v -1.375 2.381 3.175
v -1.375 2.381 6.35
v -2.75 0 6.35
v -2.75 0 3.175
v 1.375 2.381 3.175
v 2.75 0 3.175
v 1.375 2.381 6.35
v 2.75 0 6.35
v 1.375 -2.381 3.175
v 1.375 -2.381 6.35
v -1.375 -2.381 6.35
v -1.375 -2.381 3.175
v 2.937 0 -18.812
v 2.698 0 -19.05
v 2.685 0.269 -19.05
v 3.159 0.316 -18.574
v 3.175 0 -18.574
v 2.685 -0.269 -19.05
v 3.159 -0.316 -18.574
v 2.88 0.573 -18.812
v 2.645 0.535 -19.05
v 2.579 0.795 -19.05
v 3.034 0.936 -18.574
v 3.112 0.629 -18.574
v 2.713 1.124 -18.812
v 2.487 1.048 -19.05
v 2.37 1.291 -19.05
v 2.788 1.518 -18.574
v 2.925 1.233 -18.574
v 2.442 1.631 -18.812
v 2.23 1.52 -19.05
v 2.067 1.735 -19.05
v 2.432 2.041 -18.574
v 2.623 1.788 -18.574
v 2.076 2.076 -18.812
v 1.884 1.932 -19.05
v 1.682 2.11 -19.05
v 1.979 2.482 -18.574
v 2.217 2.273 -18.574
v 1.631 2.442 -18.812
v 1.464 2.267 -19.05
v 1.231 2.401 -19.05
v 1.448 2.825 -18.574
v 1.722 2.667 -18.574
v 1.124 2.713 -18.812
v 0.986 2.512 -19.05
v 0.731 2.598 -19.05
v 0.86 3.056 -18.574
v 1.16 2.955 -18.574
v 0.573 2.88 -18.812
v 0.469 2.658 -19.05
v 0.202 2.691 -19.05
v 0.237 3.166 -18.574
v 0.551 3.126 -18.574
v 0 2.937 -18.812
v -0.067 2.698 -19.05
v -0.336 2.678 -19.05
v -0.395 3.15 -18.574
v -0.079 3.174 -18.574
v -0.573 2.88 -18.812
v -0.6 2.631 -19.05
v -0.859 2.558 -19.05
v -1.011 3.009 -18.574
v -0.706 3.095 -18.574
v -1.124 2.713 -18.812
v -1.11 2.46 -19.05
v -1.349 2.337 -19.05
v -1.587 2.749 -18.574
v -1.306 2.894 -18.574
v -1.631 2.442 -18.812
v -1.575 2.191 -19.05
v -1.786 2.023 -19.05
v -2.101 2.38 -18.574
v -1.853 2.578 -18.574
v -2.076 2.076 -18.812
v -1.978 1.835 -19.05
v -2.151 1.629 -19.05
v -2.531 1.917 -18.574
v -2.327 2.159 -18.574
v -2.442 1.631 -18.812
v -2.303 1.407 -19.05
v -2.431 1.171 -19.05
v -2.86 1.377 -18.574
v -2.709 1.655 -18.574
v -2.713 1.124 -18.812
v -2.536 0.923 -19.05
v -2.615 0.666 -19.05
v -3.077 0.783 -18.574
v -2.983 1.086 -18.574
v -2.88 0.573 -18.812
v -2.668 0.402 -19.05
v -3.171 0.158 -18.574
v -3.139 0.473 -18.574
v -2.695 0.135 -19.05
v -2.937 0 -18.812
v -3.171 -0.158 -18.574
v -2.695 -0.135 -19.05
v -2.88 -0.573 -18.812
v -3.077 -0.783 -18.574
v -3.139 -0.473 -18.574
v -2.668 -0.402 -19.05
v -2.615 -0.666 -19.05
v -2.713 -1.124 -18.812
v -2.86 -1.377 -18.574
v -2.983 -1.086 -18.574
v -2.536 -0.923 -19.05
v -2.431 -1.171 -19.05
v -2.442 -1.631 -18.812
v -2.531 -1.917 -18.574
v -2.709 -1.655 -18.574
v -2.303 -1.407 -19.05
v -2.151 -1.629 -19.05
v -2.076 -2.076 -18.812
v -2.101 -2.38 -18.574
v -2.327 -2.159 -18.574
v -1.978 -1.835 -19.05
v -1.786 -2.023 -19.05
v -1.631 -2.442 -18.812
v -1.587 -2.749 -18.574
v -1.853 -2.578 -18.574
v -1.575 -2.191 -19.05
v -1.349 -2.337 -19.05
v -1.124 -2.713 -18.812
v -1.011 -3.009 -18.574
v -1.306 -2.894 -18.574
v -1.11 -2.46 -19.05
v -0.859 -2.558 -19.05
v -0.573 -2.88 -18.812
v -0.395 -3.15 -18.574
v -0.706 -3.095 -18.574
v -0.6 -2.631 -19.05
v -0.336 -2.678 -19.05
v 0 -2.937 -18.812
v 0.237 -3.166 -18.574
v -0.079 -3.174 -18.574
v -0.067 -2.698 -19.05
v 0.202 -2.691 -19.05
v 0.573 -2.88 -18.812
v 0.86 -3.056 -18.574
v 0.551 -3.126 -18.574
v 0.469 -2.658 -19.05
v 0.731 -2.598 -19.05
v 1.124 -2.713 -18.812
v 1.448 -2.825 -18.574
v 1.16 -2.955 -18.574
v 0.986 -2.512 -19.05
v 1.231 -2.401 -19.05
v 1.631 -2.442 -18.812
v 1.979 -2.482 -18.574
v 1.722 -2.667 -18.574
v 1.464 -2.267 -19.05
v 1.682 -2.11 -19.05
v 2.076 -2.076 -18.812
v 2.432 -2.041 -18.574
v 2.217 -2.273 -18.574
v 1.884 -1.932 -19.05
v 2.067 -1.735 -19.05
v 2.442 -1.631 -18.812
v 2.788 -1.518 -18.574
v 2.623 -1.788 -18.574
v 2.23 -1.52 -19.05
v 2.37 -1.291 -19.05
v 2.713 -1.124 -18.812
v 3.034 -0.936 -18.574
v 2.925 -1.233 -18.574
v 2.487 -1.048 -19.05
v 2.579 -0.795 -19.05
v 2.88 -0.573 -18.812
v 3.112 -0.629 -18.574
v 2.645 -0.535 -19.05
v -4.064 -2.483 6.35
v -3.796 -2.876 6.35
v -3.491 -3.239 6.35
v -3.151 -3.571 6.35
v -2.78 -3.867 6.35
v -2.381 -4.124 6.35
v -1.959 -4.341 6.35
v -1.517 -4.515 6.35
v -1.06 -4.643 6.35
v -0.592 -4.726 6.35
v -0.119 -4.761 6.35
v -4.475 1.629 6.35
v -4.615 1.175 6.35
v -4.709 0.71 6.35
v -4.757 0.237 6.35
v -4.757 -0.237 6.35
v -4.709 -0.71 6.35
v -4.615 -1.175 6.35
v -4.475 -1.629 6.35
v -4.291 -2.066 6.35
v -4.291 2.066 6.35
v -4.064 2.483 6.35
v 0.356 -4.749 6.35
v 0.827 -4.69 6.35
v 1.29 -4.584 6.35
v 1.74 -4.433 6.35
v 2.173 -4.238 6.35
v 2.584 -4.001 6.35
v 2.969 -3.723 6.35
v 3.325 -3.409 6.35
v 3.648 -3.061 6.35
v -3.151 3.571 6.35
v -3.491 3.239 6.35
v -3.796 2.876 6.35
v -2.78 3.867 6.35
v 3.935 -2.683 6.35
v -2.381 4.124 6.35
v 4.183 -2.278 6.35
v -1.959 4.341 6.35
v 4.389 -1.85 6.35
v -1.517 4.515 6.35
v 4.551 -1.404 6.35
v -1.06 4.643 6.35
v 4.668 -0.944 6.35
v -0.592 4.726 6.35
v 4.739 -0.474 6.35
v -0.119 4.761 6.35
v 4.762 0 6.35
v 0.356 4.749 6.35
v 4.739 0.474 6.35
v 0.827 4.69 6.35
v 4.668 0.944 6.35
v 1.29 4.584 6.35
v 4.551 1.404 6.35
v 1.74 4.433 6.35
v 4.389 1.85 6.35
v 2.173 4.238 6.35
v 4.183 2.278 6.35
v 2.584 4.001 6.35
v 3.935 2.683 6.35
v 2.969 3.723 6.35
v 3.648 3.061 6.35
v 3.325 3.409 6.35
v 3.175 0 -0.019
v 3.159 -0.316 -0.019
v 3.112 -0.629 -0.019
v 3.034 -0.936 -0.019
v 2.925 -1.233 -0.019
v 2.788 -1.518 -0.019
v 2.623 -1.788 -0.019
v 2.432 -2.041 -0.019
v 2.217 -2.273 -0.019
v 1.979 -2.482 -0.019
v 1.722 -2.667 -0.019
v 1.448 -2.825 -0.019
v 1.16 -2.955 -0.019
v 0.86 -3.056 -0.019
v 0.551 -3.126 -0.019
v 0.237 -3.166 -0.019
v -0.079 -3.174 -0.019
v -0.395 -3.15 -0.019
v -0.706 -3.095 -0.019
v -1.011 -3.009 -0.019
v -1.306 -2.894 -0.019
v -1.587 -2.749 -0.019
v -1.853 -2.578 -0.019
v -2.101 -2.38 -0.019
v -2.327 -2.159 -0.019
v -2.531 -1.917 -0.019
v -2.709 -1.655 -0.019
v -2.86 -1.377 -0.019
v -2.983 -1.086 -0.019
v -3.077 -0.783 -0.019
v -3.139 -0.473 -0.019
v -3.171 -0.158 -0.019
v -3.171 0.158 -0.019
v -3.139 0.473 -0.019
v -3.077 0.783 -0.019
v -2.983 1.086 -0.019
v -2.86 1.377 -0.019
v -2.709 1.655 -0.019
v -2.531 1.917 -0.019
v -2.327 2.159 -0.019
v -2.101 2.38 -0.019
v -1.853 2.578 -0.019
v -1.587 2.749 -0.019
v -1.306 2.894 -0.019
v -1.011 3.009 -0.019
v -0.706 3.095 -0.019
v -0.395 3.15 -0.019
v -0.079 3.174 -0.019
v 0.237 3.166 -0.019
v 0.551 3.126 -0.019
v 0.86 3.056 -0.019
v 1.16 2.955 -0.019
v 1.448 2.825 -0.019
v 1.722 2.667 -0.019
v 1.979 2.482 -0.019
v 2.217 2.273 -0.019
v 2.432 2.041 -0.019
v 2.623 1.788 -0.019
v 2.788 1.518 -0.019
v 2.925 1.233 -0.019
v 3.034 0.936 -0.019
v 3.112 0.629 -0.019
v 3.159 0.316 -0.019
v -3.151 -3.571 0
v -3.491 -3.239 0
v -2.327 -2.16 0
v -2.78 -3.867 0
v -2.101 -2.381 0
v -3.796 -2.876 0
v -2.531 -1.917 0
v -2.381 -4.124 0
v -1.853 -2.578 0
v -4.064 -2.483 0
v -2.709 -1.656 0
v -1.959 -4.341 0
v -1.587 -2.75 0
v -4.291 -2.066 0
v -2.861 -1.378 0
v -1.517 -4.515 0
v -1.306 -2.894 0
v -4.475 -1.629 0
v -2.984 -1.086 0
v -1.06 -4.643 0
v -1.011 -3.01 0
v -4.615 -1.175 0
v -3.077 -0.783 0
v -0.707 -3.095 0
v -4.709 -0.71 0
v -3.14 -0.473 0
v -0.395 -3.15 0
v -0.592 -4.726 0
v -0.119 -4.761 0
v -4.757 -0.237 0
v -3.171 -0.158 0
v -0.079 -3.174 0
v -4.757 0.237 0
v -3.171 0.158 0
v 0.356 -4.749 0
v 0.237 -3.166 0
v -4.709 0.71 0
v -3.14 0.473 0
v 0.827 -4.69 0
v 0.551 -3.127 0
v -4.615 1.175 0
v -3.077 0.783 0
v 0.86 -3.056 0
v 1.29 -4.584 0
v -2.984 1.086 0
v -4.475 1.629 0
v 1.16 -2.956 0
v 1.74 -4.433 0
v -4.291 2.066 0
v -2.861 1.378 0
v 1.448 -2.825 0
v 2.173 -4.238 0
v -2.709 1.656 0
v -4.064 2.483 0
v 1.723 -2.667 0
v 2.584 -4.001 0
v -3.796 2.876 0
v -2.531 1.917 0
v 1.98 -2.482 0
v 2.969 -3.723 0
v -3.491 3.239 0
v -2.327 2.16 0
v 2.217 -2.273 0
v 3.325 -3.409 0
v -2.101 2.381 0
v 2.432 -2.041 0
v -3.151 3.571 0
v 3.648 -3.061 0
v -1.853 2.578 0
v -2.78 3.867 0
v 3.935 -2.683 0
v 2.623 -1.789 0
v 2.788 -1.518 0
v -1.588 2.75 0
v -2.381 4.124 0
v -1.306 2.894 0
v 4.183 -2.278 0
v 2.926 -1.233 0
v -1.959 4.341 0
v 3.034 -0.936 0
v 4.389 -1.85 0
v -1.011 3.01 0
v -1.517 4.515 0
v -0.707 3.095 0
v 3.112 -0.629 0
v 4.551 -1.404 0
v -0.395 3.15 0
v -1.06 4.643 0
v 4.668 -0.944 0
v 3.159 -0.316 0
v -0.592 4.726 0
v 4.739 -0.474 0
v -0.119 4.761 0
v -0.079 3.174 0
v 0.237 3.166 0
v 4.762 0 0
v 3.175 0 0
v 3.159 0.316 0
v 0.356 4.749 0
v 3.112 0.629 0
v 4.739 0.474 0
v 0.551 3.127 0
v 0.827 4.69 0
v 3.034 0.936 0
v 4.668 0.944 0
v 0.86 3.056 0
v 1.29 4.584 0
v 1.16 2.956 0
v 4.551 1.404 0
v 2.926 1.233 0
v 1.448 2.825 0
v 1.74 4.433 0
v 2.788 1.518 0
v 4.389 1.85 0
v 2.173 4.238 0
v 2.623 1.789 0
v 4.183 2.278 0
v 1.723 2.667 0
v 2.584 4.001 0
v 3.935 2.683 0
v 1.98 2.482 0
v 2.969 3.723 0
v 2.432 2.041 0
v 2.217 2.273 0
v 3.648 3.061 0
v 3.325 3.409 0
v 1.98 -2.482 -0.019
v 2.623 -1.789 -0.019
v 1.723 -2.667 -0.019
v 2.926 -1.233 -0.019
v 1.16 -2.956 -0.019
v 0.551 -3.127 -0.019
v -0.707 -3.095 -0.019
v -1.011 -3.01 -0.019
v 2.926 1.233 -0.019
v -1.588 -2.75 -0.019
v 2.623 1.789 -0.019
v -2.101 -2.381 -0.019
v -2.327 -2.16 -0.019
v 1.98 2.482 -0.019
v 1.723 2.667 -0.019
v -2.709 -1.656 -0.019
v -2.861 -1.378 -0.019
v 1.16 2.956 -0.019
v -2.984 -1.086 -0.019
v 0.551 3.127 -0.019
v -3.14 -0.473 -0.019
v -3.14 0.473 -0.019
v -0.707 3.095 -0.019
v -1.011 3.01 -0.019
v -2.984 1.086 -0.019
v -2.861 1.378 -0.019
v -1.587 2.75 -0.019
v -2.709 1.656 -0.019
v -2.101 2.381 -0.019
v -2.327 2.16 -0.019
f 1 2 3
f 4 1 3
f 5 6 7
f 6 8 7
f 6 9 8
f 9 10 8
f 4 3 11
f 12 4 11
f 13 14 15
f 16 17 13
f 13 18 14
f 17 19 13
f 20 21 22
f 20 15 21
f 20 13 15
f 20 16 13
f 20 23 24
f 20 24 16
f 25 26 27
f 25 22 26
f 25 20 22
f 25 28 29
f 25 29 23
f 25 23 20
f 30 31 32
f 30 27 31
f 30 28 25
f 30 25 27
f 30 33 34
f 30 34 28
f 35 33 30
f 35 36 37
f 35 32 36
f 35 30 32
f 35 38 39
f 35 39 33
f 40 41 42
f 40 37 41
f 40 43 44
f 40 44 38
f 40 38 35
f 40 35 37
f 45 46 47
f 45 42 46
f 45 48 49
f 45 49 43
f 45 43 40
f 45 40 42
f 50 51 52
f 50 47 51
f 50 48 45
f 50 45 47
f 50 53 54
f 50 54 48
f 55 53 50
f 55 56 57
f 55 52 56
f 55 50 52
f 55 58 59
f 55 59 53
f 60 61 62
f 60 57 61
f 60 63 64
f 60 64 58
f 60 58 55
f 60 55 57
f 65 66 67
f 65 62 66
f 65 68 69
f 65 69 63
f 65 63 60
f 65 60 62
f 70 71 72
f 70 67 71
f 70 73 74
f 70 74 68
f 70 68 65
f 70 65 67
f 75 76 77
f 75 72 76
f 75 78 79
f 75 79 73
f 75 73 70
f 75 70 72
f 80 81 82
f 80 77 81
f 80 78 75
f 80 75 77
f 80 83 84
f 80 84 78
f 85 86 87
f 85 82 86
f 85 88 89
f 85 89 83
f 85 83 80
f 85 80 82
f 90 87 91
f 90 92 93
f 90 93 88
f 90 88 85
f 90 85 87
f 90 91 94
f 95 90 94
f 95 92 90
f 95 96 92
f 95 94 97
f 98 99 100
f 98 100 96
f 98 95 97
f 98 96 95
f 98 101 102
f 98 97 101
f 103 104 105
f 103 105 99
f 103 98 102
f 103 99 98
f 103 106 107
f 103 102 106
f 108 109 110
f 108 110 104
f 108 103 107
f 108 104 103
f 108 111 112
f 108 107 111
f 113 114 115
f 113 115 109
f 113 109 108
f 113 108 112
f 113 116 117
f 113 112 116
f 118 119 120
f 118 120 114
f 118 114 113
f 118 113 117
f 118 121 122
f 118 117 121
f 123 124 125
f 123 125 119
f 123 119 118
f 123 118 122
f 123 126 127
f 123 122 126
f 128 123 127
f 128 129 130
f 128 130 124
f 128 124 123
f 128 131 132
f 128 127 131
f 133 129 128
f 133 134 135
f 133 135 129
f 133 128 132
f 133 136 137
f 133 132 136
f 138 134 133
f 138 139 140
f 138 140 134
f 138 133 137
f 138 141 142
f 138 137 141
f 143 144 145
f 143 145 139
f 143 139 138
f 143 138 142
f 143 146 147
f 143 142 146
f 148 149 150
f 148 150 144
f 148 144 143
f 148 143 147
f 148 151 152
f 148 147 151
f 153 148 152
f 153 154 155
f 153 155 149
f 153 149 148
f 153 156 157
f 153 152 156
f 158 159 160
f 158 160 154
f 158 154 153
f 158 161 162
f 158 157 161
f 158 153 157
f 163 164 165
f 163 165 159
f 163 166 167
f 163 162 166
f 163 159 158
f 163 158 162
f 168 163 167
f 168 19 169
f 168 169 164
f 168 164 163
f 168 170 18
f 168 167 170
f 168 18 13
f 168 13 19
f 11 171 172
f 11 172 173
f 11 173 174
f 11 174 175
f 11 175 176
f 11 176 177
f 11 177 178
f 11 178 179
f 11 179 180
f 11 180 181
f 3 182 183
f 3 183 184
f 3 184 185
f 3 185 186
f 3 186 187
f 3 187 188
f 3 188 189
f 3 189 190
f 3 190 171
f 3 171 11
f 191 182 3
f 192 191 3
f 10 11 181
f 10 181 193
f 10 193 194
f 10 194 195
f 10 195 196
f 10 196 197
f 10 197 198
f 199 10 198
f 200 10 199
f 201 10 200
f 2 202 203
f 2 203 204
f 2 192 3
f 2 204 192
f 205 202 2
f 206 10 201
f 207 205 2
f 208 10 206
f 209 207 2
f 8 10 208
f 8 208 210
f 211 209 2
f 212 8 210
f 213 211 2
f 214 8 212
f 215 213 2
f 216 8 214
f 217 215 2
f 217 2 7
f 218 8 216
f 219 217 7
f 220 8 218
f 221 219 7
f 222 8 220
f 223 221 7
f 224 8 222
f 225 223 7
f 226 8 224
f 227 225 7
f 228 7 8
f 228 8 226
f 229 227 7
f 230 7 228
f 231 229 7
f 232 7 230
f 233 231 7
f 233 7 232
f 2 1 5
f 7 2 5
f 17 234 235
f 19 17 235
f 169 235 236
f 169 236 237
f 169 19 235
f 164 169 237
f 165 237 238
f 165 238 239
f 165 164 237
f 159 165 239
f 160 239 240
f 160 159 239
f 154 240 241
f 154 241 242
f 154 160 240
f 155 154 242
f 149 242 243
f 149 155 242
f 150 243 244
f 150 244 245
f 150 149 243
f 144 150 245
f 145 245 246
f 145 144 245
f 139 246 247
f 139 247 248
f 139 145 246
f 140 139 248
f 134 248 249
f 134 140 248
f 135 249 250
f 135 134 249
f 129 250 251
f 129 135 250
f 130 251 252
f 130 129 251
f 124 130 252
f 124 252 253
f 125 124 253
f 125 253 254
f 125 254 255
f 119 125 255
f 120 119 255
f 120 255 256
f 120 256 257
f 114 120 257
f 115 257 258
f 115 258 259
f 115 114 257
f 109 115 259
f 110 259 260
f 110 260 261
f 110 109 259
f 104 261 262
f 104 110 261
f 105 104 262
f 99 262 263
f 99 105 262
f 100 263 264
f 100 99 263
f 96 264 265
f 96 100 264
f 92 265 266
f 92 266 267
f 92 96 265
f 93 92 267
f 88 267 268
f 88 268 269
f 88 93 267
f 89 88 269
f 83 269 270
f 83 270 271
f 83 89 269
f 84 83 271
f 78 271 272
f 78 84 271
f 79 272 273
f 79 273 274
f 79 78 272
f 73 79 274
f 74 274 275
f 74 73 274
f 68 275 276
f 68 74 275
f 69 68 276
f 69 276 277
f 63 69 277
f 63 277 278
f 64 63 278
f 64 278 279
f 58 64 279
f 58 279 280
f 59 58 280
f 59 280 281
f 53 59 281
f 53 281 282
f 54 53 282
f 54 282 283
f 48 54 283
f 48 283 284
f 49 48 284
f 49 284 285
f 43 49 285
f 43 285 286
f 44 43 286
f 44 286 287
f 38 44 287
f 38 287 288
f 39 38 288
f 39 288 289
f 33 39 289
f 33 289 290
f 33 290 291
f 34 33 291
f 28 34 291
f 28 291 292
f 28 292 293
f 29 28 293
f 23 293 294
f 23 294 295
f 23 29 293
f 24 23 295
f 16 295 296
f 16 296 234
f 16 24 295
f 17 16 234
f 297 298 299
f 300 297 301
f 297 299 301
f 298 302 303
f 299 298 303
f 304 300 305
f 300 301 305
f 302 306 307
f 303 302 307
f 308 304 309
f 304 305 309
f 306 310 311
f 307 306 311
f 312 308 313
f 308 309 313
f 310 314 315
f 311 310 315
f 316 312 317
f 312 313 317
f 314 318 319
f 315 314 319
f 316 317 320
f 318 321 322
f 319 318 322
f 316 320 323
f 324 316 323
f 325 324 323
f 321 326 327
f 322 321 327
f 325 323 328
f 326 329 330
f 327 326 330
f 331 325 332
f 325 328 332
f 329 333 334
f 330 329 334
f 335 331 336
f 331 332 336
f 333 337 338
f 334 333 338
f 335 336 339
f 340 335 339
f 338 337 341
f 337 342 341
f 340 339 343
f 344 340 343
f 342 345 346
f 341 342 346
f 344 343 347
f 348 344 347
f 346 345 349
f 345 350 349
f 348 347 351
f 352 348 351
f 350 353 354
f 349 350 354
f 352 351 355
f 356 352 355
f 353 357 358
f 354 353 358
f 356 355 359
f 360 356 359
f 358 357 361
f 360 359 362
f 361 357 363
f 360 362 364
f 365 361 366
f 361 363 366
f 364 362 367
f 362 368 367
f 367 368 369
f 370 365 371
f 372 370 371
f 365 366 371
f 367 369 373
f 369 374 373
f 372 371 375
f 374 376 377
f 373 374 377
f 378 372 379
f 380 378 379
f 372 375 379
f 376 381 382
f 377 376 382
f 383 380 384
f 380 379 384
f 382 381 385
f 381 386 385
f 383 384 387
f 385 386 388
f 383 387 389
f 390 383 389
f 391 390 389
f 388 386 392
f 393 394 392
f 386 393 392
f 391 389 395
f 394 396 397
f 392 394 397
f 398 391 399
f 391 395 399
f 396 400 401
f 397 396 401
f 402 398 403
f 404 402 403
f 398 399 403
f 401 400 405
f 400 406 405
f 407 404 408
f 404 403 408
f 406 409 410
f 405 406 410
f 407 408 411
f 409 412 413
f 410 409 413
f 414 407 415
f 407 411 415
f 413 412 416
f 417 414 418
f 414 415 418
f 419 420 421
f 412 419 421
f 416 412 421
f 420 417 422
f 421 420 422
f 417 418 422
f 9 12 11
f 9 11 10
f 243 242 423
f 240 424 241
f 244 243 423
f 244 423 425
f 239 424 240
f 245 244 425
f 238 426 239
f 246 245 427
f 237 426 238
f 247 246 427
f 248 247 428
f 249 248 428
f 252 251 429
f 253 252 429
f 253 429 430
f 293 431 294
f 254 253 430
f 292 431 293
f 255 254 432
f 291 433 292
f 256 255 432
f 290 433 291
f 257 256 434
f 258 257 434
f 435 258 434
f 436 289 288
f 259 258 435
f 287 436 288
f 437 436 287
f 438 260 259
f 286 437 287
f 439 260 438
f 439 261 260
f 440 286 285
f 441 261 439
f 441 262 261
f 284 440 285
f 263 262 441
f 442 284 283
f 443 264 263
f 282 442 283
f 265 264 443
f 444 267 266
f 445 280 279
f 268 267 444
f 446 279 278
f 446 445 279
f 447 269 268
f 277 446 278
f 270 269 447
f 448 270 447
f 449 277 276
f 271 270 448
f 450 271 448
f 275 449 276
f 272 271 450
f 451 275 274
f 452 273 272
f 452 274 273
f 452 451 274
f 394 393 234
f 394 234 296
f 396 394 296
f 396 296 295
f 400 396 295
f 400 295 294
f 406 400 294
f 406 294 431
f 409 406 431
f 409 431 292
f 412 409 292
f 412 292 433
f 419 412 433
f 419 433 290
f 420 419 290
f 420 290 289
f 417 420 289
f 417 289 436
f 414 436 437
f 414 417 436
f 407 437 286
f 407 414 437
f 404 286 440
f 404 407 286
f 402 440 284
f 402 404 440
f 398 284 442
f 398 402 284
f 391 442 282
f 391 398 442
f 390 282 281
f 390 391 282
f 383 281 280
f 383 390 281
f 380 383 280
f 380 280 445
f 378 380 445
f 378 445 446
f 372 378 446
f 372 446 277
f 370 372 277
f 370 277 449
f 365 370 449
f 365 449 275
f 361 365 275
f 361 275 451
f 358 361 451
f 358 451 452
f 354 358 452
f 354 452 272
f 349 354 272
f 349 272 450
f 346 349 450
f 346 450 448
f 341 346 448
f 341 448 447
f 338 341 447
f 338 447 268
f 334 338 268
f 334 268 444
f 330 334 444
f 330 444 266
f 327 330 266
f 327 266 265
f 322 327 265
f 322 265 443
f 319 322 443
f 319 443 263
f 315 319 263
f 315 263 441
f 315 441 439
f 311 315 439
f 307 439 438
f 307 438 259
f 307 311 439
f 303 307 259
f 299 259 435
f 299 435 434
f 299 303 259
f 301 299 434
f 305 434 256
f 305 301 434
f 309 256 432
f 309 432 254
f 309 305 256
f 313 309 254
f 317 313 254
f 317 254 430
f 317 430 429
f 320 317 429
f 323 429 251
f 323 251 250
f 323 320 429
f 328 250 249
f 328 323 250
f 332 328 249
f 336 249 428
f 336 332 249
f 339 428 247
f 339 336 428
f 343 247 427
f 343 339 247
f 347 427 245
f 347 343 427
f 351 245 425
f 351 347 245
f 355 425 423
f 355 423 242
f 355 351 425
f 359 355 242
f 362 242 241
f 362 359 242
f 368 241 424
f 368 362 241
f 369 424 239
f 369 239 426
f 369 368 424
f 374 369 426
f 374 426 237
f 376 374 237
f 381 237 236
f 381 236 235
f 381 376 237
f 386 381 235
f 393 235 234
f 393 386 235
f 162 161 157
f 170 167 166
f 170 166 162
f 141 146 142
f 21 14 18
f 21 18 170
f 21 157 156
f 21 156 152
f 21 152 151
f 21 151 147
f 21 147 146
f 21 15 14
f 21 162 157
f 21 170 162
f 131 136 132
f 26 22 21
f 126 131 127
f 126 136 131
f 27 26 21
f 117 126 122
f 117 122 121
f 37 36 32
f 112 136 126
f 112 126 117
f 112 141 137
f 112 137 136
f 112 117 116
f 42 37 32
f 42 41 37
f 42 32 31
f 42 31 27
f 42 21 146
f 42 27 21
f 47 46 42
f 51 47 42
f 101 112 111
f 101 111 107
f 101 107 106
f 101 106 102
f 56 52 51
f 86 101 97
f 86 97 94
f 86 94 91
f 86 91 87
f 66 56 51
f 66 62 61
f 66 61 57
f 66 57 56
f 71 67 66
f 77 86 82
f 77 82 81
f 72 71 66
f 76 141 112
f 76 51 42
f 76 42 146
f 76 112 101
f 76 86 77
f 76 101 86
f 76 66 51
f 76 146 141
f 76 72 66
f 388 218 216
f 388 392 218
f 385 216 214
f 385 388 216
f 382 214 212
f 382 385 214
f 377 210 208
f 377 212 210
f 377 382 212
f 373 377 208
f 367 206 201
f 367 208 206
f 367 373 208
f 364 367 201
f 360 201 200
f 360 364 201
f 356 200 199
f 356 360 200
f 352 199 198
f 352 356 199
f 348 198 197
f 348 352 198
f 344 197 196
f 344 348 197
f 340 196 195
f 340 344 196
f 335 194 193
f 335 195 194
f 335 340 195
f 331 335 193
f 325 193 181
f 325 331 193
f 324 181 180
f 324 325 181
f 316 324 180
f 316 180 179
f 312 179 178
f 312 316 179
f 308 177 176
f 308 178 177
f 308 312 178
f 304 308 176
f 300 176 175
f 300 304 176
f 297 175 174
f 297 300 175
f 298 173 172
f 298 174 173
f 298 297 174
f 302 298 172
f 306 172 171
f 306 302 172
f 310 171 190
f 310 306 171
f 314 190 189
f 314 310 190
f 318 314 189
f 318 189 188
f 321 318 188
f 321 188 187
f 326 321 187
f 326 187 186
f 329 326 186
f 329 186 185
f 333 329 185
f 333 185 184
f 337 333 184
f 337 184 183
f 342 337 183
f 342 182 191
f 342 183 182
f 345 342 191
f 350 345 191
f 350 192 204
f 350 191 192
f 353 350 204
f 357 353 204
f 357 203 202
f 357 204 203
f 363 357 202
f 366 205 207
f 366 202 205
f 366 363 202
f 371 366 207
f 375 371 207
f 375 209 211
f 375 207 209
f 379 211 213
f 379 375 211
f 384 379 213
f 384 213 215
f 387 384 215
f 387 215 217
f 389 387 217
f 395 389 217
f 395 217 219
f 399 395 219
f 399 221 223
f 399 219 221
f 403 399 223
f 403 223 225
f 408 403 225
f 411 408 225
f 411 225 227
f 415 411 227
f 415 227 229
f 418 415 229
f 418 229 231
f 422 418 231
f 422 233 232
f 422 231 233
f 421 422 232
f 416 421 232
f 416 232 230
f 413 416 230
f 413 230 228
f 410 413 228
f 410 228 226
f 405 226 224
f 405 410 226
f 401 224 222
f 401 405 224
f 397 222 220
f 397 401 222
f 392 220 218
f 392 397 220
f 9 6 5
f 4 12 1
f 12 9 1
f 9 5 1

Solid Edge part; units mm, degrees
sketch "Sketch1" plane through (0, 0, 0) normal (0, 0, 1) x (1, 0, 0)
  circle A0 centre (0, 0) radius 4.7625
  dimension "D1" = 9.525
extrude "Protrusion1" add sketch "Sketch1" along normal blind 6.35
sketch "Sketch2" plane through (0, 0, 0) normal (0, 0, -1) x (1, 0, 0)
  circle A0 centre (0, 0) radius 3.175
extrude "Protrusion2" add sketch "Sketch2" along normal blind 19.05
sketch "Sketch3" plane through (0, 0, -19.05) normal (0, 0, -1) x (1, 0, 0)
  circle A0 centre (0, 0) radius 3.1747
extrude "Cutout1" cut sketch "Sketch3" against normal blind 19.0309 flip side to cut
chamfer "Chamfer_1" distance 0.4762 angle 45 1 edges at (-3.1747, 0, -19.05)
sketch "Sketch4" plane through (0, 0, 6.35) normal (0, 0, 1) x (1, 0, 0)
  line L0 (-1.3748, 2.3812) -> (1.3748, 2.3812)
  line L1 (2.7496, 0) -> (1.3748, 2.3812)
  line L2 (1.3748, -2.3812) -> (2.7496, 0)
  line L3 (-1.3748, -2.3812) -> (1.3748, -2.3812)
  line L4 (-2.7496, 0) -> (-1.3748, -2.3812)
  line L5 (-1.3748, 2.3812) -> (-2.7496, 0)
  dimension "D1" = 4.7625
extrude "Cutout2" cut sketch "Sketch4" against normal blind 3.175
properties part number "118797_3" material "Stainless Steel, 304"
